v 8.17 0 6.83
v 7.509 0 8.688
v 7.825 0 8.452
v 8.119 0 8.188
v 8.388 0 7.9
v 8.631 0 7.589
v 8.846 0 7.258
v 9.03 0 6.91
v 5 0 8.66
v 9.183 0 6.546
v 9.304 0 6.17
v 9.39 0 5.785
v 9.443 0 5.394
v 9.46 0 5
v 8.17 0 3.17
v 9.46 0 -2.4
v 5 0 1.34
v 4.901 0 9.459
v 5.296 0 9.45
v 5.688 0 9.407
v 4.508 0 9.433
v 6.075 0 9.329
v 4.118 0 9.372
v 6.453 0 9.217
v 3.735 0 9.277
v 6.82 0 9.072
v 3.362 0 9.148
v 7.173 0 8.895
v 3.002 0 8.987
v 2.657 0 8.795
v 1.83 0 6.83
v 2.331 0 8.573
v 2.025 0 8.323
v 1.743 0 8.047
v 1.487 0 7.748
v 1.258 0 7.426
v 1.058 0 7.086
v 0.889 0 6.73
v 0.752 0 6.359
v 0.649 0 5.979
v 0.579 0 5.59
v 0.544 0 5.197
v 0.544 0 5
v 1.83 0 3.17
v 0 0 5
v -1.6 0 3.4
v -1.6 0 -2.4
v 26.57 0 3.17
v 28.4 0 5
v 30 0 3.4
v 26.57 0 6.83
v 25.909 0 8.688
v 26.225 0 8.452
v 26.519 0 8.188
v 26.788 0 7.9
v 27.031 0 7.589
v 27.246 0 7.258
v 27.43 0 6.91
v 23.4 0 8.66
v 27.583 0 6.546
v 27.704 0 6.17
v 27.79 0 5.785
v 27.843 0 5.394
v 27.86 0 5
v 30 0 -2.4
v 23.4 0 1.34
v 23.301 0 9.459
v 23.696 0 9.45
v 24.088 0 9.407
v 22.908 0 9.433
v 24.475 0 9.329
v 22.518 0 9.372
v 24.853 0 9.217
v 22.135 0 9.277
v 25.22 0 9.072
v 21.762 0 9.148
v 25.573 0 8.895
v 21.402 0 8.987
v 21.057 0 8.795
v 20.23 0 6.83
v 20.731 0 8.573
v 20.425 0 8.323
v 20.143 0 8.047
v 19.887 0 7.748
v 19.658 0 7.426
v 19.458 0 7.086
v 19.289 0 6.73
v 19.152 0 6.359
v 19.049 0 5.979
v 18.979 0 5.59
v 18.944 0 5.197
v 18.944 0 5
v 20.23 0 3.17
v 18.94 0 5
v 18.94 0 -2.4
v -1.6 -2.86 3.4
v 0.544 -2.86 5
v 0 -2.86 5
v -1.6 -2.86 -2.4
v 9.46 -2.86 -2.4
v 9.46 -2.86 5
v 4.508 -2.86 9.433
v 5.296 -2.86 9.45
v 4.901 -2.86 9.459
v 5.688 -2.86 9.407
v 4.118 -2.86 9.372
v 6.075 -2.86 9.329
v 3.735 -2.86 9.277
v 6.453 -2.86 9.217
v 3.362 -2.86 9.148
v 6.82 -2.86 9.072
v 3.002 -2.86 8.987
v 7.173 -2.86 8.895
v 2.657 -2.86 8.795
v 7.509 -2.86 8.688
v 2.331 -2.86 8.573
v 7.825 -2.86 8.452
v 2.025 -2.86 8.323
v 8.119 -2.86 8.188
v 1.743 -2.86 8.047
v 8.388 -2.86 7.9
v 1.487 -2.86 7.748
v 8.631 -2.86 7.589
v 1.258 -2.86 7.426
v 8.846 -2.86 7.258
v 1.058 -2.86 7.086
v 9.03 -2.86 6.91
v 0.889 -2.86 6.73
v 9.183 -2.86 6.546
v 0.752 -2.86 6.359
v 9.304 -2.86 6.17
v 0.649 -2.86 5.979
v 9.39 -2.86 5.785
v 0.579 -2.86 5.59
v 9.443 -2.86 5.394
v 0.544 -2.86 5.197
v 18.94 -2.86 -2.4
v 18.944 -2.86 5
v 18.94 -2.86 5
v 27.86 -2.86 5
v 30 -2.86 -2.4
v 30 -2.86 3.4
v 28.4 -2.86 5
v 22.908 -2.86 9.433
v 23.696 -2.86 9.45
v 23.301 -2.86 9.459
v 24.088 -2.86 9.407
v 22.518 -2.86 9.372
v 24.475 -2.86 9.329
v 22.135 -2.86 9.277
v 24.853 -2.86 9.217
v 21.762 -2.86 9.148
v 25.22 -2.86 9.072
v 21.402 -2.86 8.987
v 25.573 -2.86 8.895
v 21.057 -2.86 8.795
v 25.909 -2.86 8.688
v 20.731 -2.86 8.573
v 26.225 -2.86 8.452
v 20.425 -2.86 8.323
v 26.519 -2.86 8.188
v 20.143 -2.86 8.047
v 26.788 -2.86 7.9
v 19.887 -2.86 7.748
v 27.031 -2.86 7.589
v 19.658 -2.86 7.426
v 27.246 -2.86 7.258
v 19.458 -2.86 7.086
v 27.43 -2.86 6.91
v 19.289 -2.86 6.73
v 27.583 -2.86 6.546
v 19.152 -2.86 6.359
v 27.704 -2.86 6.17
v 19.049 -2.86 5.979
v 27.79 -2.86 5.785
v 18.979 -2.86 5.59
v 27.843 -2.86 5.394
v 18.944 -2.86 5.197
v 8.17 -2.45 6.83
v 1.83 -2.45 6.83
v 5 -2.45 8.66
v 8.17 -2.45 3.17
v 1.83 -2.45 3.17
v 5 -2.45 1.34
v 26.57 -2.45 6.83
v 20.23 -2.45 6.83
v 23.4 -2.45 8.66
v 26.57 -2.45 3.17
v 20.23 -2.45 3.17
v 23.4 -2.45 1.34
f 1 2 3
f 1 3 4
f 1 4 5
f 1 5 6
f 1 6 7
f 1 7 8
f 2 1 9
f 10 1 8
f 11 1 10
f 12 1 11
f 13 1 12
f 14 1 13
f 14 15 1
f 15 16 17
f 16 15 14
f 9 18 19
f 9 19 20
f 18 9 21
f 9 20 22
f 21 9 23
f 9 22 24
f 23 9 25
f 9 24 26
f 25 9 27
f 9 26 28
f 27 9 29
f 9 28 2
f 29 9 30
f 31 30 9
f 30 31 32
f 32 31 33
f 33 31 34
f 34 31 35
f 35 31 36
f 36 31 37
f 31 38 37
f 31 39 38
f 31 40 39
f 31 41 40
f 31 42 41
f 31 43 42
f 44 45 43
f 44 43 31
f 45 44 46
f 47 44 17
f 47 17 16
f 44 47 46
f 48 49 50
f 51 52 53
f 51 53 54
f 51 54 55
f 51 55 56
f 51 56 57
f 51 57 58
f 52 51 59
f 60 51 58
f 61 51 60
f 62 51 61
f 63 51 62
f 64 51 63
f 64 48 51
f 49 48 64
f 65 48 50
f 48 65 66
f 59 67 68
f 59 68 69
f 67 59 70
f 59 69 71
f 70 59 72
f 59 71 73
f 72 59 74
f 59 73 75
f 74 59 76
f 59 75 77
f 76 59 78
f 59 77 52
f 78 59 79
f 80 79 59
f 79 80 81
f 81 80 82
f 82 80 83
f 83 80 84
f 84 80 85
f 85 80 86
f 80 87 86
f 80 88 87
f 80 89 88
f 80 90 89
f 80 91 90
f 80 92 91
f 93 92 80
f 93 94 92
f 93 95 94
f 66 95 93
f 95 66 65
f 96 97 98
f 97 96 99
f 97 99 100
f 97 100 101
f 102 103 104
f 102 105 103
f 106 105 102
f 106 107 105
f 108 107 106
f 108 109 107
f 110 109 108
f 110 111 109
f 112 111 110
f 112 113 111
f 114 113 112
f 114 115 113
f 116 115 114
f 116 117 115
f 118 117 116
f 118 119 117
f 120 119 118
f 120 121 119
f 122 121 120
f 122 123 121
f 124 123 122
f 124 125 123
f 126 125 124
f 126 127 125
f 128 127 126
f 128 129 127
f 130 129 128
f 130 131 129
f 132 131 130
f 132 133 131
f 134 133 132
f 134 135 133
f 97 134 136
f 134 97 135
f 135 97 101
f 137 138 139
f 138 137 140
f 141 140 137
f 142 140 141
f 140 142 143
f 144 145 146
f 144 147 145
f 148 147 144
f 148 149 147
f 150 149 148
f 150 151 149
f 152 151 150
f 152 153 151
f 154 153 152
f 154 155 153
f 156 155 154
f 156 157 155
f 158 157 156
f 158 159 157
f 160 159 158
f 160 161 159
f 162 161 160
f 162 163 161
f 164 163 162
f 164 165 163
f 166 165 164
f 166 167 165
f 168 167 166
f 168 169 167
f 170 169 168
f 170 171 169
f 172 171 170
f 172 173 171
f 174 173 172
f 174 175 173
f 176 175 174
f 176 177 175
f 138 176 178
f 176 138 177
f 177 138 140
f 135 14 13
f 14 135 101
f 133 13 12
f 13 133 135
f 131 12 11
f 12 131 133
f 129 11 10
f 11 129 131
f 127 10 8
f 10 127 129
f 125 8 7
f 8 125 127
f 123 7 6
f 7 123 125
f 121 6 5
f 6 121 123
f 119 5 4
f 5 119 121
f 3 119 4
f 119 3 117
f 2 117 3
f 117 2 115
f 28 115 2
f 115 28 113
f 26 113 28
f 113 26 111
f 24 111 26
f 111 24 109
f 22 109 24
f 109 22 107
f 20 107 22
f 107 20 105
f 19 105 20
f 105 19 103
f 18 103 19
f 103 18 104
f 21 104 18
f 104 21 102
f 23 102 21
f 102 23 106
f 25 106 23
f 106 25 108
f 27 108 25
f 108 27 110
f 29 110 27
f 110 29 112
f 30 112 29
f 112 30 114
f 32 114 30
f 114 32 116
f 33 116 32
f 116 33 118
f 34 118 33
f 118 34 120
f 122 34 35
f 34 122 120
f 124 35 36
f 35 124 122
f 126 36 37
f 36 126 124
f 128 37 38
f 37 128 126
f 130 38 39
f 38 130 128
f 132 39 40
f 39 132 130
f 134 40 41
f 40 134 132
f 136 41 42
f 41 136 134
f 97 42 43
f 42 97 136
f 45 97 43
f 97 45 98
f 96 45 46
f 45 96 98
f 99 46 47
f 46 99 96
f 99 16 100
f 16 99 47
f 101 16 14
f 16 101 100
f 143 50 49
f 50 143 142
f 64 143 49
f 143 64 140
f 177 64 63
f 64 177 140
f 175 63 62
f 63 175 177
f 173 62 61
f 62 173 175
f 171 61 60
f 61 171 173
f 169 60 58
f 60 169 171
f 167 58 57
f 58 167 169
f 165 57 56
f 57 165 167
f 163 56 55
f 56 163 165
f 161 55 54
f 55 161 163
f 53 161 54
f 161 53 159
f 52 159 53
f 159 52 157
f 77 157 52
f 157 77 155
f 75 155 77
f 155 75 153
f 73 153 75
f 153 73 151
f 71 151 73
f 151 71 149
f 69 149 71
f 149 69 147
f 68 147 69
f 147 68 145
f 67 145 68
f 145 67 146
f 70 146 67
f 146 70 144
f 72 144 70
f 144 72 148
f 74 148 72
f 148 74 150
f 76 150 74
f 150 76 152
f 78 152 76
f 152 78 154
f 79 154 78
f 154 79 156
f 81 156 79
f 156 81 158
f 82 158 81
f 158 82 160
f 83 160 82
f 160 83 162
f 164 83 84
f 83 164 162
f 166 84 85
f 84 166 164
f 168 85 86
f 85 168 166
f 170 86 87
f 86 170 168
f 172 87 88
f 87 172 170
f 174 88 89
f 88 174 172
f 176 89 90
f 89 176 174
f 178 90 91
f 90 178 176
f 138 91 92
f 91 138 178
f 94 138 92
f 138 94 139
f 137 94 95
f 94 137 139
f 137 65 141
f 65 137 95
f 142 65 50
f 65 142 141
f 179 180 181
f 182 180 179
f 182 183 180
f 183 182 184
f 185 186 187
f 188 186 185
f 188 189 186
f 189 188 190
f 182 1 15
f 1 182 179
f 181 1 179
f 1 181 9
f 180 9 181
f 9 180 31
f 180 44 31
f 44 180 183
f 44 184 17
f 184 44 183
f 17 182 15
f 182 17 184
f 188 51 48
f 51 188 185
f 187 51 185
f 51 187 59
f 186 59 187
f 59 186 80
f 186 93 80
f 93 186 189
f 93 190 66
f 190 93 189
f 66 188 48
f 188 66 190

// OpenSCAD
// Copyright (C) 2025 Arif K. Rafiq
// This program is free software: you can redistribute it and/or modify
// it under the terms of the GNU General Public License as published by
// the Free Software Foundation, either version 3 of the License, or
// (at your option) any later version.

// This program is distributed in the hope that it will be useful,
// but WITHOUT ANY WARRANTY; without even the implied warranty of
// MERCHANTABILITY or FITNESS FOR A PARTICULAR PURPOSE.  See the
// GNU General Public License for more details.

// You should have received a copy of the GNU General Public License
// along with this file.  If not, see <https://www.gnu.org/licenses/>,
// or write to: license@temperedoptimism.com


/* 
(b)readth       :(w)est (X-)   (c)enter (X0) (e)east (X+)
Vectors (v)     :(x), (y), (z)
Thicknesses (t) : Thicknesses to resolve 3D printer limits or rendering issues.
Proportion (p)  : container for grouping (r)adius and (i)ntensity into a singl 2d vector acccessed using .x and .y respectively
*/

// Fixed in example3.scad       // Set limits in customizer
/* [Thicknesses (x),(y),(z)] */
tFitGap = [0.16, 0.16, 0.16];   //[0.00:0.01:0.64] 
tWallMin = [0.40, 0.40, 0.16];  //[0.16:0.08:1.60] 
/* [Proportional (x):(Radius, (y):(i)ntensity] */
pHexSink = [3.5, 2.3];          //[0.10:0.02:20.00] 
/* [2D vectors (x), (y)] */
vTerminalW = [5.0, 5.0];        //[0.00:0.10:100] 
vTerminalE = [23.4, 5.0];       //[0.00:0.10:100] 
/* [Scalars] */
leadingEdge = 2.4; //[0.8:0.4:5.0]
flankEdge = 1.6; //[0.8:0.4:5.0]
bBoard = 28.4; //[20:0.1:100.0]
/* [Special ] */
fa0 = 4.0;     //[1:1:60]  
fs0 = 0.4;     //[0.1:0.1:4.0]  
fx0 = 3;       //[1,2,3,4,5,6,7,8,9,10]
rCorner = 1.6; //0.1
/* [Hidden] */ 
tEps=0.01; 

/* Calucualted at run time. */
pHexSurround = [pHexSink.x + (tWallMin.x * 2) + tFitGap.x, pHexSink.y + tWallMin.y + tFitGap.y];

//30.00-35.00 Circles, Also look at the customizer!!
// Rotate
rotate([90,0,0]){
  difference(){

    linear_extrude(pHexSurround.y, convexity=fx0){ 
      polygon([[vTerminalW.x + pHexSurround.x, vTerminalW.y],
              [ vTerminalW.x + pHexSurround.x, -leadingEdge],
              [-flankEdge, -leadingEdge],
              [-flankEdge, vTerminalW.y - rCorner],
              [-flankEdge + rCorner, vTerminalW.y]]);
      polygon([[vTerminalE.x - pHexSurround.x, vTerminalE.y],
              [ vTerminalE.x - pHexSurround.x, -leadingEdge],
              [bBoard + flankEdge, -leadingEdge],
              [bBoard + flankEdge, vTerminalE.y - rCorner],
              [bBoard + flankEdge - rCorner, vTerminalE.y]]);       
              
      for(v = [vTerminalW, vTerminalE]){
        translate(v)  circle(pHexSurround.x, $fa=fa0, $fs=fs0 );
      }
    }
    //hex pocket
    // Solve Conflicting bodies                       
    translate([0,0, -tEps]) linear_extrude(pHexSink.y + tFitGap.y, convexity=fx0){
      translate(vTerminalW)  rotate([0,0,30]) circle(pHexSink.x + tFitGap.y, $fn=6);
      translate(vTerminalE)  rotate([0,0,30]) circle(pHexSink.x + tFitGap.y, $fn=6);
    }
  }
}
